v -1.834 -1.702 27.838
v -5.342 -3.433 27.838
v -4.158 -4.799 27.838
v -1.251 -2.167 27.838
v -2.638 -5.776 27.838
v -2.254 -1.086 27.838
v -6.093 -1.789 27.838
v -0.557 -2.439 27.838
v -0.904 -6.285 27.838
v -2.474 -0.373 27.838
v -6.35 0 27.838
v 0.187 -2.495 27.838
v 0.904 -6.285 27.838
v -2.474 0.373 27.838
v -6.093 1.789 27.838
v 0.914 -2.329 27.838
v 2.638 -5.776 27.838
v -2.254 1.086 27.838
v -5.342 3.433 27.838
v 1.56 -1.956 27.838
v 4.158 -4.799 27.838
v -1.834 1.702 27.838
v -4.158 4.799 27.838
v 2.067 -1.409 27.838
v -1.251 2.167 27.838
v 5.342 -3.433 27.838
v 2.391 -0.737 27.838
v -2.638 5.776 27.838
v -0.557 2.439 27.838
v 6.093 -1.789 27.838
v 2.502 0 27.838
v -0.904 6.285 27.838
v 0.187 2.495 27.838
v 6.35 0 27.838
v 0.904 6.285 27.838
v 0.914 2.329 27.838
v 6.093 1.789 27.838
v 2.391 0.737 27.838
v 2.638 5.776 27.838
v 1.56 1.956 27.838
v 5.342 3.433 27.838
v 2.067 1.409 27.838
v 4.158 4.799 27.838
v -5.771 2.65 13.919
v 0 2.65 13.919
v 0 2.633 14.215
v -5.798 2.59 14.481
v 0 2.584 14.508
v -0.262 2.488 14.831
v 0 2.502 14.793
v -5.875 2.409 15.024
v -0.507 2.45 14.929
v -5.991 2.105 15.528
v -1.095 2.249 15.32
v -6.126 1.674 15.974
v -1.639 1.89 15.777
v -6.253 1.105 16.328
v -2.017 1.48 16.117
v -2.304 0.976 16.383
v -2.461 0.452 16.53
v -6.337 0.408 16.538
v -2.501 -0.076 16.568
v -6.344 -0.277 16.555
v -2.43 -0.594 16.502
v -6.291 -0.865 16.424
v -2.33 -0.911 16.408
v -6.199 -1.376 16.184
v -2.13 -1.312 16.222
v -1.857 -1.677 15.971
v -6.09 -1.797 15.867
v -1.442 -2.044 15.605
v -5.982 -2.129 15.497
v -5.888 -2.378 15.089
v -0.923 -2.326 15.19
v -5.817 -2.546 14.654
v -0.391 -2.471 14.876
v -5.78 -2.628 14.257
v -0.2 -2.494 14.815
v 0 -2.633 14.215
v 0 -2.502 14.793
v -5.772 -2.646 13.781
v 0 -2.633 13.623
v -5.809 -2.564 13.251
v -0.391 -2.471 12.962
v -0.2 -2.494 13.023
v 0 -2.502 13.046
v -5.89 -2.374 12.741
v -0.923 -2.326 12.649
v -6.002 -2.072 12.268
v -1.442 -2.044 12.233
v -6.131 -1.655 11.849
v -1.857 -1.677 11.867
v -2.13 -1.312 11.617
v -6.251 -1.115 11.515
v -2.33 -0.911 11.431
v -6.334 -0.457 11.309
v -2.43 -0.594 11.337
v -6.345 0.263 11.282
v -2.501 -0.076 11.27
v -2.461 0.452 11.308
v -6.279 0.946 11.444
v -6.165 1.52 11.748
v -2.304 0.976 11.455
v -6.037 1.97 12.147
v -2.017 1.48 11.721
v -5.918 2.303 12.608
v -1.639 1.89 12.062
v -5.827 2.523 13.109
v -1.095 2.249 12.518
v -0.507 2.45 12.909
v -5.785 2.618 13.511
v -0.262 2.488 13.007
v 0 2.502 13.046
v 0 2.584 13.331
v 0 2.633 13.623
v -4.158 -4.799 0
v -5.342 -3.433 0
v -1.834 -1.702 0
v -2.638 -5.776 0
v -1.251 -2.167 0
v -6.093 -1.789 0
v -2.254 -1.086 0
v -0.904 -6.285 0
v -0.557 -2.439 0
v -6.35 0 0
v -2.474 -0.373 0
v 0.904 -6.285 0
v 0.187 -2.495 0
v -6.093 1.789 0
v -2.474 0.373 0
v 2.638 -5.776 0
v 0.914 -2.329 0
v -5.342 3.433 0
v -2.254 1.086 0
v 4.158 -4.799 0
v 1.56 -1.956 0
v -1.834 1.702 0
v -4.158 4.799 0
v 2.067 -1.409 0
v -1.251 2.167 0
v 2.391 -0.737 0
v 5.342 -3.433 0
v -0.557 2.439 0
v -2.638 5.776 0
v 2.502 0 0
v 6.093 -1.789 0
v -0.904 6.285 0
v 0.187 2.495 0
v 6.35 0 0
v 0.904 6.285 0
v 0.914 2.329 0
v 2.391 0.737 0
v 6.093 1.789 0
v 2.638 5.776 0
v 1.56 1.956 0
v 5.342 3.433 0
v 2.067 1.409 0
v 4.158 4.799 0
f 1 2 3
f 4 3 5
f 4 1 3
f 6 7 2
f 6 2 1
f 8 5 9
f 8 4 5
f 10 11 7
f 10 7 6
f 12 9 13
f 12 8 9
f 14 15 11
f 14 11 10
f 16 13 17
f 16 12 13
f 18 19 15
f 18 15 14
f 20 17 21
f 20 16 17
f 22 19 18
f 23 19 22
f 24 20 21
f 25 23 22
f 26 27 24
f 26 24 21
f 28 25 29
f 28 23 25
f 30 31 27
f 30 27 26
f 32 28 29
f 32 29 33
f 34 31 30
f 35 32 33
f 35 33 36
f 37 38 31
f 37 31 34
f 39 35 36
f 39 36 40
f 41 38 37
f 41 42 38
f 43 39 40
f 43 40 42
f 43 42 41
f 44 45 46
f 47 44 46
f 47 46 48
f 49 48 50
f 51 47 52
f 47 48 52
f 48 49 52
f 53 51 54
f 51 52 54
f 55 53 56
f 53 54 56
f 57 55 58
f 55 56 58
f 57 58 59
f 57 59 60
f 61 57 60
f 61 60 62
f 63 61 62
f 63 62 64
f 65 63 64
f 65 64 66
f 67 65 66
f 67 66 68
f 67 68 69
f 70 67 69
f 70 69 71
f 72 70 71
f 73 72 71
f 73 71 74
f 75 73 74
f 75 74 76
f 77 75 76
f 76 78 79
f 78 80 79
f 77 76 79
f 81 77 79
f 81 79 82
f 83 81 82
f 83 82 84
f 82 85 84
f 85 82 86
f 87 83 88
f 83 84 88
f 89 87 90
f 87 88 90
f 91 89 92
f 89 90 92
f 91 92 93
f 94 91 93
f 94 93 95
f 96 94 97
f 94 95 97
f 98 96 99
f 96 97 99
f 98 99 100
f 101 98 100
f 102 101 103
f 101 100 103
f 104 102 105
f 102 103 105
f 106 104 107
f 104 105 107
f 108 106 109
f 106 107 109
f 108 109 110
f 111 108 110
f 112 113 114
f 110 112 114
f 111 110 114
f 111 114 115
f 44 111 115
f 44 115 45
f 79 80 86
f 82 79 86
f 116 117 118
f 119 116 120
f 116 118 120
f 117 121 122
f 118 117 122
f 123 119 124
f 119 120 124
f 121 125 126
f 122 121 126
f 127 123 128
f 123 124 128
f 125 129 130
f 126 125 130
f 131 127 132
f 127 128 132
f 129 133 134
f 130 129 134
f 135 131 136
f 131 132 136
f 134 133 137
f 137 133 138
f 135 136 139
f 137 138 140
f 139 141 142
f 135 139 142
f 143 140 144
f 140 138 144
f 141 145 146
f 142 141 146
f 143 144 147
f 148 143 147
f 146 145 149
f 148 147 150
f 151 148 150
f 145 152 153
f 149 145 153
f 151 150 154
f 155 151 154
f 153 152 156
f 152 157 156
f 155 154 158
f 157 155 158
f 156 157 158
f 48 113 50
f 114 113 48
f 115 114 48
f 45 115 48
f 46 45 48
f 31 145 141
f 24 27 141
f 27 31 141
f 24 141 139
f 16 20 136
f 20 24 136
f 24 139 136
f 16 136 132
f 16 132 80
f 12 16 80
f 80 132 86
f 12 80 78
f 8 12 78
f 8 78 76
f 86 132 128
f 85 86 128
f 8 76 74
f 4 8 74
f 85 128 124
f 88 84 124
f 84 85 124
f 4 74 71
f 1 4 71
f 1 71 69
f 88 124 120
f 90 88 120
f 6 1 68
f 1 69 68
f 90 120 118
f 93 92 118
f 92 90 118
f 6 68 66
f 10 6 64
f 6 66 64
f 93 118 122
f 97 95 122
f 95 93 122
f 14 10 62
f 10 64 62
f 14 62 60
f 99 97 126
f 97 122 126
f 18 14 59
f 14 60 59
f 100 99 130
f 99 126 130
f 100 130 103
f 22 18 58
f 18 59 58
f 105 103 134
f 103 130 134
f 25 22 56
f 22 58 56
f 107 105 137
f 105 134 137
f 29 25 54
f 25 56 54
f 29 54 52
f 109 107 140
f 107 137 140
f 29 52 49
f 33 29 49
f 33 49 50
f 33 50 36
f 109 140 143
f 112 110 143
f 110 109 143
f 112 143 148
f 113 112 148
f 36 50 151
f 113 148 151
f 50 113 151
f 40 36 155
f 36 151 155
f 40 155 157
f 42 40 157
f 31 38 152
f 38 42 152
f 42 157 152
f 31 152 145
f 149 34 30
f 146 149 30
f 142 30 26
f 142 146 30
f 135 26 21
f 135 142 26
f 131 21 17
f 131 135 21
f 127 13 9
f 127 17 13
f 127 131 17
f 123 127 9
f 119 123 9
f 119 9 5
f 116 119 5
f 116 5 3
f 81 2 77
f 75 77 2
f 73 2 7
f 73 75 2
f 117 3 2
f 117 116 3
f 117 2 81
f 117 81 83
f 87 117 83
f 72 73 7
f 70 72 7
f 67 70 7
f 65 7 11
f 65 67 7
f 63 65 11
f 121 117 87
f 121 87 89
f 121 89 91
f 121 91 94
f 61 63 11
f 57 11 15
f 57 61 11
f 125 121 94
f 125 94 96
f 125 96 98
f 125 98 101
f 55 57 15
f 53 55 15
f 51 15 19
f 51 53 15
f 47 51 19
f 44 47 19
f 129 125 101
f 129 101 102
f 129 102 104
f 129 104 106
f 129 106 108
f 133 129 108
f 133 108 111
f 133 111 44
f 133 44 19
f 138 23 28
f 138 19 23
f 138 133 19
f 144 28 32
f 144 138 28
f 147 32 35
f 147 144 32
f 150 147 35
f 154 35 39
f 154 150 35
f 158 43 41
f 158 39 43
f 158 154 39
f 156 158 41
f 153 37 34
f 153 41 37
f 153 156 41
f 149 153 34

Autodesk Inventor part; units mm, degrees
ref_plane "YZ Plane" through (0, 0, 0) normal (1, 0, 0) x (0, 1, 0)
ref_plane "XZ Plane" through (0, 0, 0) normal (0, 1, 0) x (-1, 0, 0)
ref_plane "XY Plane" through (0, 0, 0) normal (0, 0, 1) x (1, 0, 0)
sketch "Sketch1" plane through (0, 0, 0) normal (0, 0, 1) x (1, 0, 0)
  circle A0 centre (0, 0) radius 17.4793 construction
  circle A1 centre (0, 0) radius 23.2285 construction
  circle A2 centre (0, 0) radius 6.35
  circle A3 centre (0, 0) radius 2.5019
  dimension "d0" = 46.4569
  dimension "d1" = 34.9586
  dimension "d2" = 12.7
  dimension "d3" = 5.0038
extrude "Extrusion1" add sketch "Sketch1" along normal blind 27.8384
sketch "Sketch2" plane through (0, 0, 0) normal (1, 0, 0) x (0, 1, 0)
  line L0 (0, 0) -> (0, 27.8384) construction
  line L1 (6.35, 27.8384) -> (-6.35, 27.8384) construction
  circle A0 centre (0, 13.9192) radius 2.65
  dimension "d6" = 5.3
extrude "Extrusion2" cut sketch "Sketch2" against normal through all
ref_plane "Work Plane1" through (0, 0, 0) normal (0, 0, 1) x (1, 0, 0)
sketch "Sketch3" plane through (0, 0, 0) normal (0, 0, 1) x (1, 0, 0)
  circle A0 centre (0, 0) radius 22.9615 construction
properties part number "Inner Gear Extruded"
